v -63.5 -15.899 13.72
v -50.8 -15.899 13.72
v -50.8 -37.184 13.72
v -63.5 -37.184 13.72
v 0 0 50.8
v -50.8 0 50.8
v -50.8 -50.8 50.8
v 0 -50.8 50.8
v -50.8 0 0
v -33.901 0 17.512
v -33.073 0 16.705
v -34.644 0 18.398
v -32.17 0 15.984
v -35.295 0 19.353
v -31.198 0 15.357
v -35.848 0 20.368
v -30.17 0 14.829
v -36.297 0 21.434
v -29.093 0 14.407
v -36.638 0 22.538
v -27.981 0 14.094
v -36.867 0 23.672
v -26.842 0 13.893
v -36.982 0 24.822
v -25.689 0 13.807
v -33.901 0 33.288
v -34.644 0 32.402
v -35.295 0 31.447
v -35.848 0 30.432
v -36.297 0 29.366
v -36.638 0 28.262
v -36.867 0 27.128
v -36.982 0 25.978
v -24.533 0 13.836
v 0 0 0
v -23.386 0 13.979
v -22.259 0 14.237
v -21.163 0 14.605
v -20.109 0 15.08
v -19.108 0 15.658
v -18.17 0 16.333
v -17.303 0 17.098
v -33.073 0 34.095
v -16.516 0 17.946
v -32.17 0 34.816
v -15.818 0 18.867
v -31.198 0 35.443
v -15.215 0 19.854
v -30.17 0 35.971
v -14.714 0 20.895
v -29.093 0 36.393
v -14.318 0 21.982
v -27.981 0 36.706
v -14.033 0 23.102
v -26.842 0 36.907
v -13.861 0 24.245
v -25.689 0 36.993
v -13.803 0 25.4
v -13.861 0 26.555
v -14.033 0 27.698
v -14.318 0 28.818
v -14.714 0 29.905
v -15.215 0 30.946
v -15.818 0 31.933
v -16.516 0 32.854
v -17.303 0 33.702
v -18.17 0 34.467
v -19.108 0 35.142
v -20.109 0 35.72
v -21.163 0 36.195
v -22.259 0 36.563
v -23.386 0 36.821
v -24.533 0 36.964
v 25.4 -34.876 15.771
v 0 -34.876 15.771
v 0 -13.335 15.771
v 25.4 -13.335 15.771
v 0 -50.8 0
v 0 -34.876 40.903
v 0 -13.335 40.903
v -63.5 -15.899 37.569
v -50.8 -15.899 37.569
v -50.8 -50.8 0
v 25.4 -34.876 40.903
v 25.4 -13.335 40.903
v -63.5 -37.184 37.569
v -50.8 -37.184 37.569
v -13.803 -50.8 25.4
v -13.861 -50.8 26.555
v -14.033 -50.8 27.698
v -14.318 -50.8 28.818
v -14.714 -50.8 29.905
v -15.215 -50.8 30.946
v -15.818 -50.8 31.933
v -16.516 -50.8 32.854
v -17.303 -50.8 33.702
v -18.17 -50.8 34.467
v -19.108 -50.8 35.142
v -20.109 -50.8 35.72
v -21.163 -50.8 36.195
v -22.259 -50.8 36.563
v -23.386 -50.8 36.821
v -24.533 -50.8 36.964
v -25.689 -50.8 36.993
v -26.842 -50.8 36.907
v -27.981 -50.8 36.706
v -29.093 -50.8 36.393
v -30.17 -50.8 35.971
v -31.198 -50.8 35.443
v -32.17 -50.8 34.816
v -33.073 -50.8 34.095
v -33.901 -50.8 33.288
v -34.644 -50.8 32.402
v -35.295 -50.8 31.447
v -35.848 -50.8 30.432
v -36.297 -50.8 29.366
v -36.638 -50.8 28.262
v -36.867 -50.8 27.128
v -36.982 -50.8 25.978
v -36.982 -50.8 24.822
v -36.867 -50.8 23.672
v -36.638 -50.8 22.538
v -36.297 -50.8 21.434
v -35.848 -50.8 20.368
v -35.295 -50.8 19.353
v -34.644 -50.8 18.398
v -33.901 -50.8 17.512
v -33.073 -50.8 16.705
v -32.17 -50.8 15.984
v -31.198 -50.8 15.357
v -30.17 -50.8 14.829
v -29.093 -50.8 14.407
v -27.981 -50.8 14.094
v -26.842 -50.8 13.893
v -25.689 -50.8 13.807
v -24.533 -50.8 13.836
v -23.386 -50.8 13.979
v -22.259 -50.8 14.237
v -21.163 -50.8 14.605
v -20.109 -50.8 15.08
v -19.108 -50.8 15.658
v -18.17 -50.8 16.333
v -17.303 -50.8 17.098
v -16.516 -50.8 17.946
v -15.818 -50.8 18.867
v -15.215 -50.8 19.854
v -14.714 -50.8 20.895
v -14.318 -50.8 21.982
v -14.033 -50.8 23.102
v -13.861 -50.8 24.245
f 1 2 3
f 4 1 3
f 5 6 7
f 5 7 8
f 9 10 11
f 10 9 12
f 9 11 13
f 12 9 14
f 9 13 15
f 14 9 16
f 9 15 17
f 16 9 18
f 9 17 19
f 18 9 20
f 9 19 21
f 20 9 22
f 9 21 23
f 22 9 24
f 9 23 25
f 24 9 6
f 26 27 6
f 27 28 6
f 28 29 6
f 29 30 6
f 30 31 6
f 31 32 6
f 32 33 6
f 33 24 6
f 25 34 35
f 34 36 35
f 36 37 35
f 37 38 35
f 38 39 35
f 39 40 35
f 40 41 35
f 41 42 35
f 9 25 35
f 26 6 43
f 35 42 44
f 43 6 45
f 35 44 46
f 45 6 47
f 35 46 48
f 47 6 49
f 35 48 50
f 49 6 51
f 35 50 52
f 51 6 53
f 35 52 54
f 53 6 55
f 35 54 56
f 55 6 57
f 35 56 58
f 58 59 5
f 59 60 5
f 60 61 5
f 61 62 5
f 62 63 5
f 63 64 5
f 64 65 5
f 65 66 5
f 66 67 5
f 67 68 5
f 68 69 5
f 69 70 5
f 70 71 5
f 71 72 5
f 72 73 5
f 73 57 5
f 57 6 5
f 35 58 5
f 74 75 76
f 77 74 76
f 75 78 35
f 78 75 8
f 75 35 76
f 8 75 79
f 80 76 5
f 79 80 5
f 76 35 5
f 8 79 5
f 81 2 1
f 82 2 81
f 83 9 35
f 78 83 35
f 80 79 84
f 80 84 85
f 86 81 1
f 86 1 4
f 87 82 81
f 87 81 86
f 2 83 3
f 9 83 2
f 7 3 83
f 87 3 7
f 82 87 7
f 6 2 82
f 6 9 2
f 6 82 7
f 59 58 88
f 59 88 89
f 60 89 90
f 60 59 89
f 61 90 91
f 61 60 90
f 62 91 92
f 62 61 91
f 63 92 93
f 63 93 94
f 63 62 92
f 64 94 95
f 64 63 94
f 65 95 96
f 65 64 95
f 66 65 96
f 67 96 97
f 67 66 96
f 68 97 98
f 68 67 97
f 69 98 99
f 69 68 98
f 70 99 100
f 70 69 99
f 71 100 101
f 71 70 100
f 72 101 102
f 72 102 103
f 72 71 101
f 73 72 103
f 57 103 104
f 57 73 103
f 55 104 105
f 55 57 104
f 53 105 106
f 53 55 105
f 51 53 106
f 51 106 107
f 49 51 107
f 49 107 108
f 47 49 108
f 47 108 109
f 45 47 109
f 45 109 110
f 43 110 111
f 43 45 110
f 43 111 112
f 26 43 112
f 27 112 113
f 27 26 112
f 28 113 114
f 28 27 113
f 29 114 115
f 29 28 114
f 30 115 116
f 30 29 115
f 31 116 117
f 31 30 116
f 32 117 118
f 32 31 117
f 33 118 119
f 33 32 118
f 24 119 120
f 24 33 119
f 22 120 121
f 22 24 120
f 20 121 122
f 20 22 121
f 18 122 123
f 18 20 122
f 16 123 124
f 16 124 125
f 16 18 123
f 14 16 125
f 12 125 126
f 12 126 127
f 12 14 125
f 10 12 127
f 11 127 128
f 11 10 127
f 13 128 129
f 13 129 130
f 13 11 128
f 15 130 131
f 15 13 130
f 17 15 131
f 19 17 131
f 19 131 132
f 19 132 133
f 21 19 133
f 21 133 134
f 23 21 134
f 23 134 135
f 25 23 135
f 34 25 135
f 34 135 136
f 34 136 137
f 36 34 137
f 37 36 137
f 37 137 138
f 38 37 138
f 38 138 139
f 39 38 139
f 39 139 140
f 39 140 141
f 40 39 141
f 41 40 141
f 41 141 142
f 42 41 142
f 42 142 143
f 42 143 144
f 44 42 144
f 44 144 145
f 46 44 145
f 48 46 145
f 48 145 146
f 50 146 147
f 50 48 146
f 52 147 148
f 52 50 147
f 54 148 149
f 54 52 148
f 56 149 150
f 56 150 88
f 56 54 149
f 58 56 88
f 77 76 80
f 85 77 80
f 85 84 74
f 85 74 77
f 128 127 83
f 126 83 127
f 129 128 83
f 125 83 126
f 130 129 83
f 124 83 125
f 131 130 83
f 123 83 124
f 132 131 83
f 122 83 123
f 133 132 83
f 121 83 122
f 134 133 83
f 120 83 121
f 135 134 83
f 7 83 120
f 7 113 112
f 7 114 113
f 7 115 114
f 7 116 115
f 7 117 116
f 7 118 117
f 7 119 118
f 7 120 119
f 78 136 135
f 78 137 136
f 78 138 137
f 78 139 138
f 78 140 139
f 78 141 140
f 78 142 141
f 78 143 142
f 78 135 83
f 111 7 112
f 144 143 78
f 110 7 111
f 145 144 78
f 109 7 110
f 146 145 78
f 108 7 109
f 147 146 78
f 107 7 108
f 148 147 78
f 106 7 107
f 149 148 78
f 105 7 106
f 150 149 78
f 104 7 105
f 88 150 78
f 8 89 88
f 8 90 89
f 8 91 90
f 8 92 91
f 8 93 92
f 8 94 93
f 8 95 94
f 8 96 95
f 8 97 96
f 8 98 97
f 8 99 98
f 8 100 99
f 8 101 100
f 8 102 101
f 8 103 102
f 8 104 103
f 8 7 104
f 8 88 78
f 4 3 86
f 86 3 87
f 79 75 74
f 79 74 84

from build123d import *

# Parameters (mm, degrees)
F0_W     = 50.8
F0_H     = 50.8
F0_R     = 11.596752
F1_DEPTH = 50.8
F2_W     = 21.541153
F2_H     = 25.131345
F3_DEPTH = 25.4
F4_W     = 21.284714
F4_H     = 23.849137
F5_DEPTH = 12.7


with BuildPart() as f1:
    # F0 (on Front) → F1 (new body)
    with BuildSketch(Plane.XZ):
        with Locations((-25.4, 25.4)):
            Rectangle(F0_W, F0_H)
        with Locations((-25.4, 25.4)):
            Circle(F0_R, mode=Mode.SUBTRACT)
    extrude(amount=F1_DEPTH)

    # F2 (on face) → F3 (join)
    with BuildSketch(Plane.YZ):
        with Locations((-24.105576, 28.336875)):
            Rectangle(F2_W, F2_H)
    extrude(amount=F3_DEPTH)

    # F4 (on face) → F5 (join)
    with BuildSketch(Plane(origin=(-50.8, 0, 0), x_dir=(0, -1, 0), z_dir=(-1, 0, 0))):
        with Locations((26.541781, 25.644231)):
            Rectangle(F4_W, F4_H)
    extrude(amount=F5_DEPTH)


solid = f1.part
